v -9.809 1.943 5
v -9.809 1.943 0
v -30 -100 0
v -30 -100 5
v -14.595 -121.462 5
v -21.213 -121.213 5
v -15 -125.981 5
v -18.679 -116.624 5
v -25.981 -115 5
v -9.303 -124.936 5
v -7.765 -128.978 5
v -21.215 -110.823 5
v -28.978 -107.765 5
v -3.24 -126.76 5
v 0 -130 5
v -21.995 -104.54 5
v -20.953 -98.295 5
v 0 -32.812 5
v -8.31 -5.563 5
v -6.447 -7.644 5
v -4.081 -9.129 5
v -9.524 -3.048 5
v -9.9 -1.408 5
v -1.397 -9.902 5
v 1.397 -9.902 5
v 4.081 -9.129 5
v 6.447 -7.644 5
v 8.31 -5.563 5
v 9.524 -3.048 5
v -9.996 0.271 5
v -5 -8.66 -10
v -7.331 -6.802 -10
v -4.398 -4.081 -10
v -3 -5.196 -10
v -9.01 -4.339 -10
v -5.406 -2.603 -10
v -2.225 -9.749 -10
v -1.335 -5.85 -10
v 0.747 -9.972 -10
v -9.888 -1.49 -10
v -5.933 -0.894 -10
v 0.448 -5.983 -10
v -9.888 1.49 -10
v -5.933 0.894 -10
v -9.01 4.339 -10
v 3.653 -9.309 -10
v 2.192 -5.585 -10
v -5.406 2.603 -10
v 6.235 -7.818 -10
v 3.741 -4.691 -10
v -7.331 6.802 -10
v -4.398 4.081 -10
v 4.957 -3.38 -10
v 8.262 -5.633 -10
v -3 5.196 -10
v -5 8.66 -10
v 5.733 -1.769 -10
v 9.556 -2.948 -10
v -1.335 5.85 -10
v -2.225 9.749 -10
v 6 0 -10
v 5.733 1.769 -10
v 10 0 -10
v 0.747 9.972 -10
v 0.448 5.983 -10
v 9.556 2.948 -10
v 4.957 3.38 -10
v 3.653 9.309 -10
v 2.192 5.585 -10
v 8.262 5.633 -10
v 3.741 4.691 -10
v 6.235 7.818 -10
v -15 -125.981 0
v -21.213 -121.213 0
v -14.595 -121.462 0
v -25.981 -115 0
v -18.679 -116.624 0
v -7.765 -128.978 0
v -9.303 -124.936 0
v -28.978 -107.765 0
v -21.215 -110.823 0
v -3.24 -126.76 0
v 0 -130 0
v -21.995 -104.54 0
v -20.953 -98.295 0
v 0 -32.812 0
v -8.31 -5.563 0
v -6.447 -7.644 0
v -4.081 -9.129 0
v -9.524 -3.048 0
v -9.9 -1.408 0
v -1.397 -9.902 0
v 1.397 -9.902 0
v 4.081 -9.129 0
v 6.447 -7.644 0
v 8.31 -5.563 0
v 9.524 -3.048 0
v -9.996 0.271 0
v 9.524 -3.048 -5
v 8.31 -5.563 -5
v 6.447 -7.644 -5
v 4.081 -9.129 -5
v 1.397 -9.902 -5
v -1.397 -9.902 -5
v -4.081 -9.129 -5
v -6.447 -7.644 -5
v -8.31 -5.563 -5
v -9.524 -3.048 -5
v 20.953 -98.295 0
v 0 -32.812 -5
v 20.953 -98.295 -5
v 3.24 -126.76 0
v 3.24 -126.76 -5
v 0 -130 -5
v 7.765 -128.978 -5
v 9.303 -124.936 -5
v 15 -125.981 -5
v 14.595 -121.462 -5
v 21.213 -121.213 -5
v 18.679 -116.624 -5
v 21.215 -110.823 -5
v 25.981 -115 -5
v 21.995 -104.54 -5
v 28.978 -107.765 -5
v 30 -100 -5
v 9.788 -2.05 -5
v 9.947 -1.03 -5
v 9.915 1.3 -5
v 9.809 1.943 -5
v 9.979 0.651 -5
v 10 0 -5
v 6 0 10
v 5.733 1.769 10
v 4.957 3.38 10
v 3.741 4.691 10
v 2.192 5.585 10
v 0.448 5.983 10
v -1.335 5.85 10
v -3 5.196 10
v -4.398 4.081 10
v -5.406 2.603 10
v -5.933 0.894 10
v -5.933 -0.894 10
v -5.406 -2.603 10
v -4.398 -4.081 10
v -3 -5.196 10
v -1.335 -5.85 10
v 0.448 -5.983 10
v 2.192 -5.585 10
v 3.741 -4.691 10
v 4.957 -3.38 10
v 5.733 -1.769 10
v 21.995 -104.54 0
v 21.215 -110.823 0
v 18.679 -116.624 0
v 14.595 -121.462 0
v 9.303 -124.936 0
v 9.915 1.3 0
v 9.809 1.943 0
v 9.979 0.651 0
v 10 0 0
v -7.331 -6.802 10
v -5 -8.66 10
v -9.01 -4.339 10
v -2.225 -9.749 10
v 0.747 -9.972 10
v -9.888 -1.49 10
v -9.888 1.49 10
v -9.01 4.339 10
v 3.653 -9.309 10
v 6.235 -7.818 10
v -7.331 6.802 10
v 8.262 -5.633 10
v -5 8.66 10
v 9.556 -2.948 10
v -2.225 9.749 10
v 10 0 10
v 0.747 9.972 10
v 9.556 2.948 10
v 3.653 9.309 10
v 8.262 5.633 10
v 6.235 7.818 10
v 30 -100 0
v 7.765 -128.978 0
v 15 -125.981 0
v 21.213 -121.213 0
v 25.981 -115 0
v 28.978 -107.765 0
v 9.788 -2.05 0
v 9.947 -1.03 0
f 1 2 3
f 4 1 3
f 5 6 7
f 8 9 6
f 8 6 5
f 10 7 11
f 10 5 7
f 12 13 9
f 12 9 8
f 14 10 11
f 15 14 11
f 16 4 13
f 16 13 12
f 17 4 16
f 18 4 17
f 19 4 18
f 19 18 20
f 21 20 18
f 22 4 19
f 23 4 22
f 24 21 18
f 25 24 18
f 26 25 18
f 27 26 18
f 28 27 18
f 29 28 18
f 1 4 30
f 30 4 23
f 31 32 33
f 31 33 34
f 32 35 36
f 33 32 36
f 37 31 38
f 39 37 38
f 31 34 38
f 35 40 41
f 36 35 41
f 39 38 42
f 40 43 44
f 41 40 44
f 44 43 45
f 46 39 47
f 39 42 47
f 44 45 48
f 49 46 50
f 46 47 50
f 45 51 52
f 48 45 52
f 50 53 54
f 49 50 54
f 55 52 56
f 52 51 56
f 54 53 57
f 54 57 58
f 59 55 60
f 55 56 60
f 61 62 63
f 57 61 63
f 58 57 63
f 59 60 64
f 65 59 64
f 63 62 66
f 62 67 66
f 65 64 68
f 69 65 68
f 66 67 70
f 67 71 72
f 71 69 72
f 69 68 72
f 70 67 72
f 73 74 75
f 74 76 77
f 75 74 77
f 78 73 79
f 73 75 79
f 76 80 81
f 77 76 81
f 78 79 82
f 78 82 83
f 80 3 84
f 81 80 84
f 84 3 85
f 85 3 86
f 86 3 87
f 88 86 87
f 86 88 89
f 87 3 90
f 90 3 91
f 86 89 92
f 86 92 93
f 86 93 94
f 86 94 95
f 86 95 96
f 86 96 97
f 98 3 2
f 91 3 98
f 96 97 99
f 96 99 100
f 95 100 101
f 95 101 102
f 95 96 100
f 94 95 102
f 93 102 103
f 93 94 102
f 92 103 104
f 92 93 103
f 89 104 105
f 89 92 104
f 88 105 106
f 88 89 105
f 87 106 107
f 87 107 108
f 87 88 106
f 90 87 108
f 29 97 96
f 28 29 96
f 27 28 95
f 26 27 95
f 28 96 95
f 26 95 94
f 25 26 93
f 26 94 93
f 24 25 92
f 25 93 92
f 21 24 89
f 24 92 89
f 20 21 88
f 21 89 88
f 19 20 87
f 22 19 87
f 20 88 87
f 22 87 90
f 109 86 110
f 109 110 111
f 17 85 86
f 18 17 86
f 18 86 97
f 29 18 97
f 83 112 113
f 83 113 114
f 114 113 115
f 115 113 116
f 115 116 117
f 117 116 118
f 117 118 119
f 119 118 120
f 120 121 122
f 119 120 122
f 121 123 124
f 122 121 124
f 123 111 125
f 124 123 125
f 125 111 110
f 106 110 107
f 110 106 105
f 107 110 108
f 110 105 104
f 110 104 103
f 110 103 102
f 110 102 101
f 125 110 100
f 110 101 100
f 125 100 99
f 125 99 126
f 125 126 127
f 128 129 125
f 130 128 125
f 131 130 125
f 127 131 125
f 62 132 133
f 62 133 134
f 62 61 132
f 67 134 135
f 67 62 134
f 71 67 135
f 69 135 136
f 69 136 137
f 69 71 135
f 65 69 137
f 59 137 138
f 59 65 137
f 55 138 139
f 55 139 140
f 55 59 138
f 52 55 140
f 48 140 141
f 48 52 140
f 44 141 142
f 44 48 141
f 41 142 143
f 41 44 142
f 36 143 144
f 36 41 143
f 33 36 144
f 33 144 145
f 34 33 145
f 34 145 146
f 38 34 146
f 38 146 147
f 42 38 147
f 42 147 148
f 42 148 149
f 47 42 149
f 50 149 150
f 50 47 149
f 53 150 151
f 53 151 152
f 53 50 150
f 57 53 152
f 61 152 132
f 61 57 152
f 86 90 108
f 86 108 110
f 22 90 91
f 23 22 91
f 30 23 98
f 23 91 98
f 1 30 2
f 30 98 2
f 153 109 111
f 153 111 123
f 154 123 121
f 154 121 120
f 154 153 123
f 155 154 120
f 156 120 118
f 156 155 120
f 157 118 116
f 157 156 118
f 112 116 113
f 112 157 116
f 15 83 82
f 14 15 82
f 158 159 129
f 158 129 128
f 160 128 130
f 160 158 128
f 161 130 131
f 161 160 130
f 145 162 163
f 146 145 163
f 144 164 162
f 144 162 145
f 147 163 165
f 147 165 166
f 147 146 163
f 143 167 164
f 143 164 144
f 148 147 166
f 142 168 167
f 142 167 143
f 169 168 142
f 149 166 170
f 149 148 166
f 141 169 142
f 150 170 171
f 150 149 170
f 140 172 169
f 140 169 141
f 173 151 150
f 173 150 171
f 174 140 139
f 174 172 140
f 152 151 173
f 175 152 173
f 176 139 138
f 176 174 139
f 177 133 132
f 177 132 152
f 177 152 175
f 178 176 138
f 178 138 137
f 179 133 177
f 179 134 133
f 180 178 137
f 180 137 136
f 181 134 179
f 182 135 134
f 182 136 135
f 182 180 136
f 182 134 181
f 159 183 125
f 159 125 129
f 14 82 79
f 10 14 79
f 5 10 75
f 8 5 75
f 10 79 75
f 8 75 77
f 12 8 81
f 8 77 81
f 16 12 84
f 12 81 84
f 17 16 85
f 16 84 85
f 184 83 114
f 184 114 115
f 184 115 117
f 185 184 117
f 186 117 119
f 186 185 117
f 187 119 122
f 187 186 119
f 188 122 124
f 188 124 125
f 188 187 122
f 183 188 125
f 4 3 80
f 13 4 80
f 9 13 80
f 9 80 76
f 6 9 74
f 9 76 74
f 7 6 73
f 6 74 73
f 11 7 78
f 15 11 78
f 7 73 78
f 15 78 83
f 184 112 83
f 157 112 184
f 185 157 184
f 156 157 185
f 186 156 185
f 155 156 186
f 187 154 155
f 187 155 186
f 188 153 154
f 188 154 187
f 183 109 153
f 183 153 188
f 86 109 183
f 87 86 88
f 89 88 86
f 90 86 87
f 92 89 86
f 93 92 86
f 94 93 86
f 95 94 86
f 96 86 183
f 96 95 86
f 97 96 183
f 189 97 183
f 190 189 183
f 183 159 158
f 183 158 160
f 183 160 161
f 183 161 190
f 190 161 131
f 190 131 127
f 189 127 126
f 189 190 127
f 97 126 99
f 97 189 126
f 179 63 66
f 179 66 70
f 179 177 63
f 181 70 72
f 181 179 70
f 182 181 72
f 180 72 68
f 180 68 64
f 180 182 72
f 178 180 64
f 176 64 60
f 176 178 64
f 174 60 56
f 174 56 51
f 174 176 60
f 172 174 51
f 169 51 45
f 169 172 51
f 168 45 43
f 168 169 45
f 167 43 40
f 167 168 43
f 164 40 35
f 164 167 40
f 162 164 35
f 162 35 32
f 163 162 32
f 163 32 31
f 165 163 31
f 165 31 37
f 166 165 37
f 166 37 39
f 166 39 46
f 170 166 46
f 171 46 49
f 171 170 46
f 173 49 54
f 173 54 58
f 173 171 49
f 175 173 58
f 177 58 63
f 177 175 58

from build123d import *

# Parameters (mm, degrees)
SKETCH1_R            = 6
BOSS_EXTRUDE1_DEPTH  = 10
BOSS_EXTRUDE14_DEPTH = 5
BOSS_EXTRUDE15_DEPTH = 5


with BuildPart() as part:
    # Sketch1 → Boss-Extrude1 (new, symmetric)
    with BuildSketch(Plane.XY):
        with BuildLine():
            ThreePointArc((9.809453986617676, 1.9428361959853027), (6.1e-16, 10.000000000000004), (-9.809453986617676, 1.9428361959853029))
            ThreePointArc((-9.809453986617676, 1.9428361959853029), (-9.983713411106137, -0.5704967352225092), (-9.524285702381553, -3.0476190476190443))
            ThreePointArc((-9.524285702381553, -3.0476190476190443), (-1.84e-15, -10.000000000000004), (9.524285702381551, -3.047619047619048))
            ThreePointArc((9.524285702381551, -3.047619047619048), (9.88035568751995, -1.5422618091920235), (10.000000000000004, -2.45e-15))
            ThreePointArc((10.000000000000004, 0), (9.952249491099408, 0.9760789245299965), (9.809453986617676, 1.9428361959853027))
        make_face()
        Circle(SKETCH1_R, mode=Mode.SUBTRACT)
    extrude(amount=BOSS_EXTRUDE1_DEPTH, both=True)


with BuildPart() as body_2:
    # Sketch1<52> → Boss-Extrude14 (new body)
    with BuildSketch(Plane.XY):
        with BuildLine():
            ThreePointArc((-30, -99.99999999999994), (-21.213203435596444, -121.21320343559641), (2.16e-15, -130))
            Line((0, -130), (-3.239870411273939, -126.76012958872607))
            ThreePointArc((-3.239870411273936, -126.76012958872607), (-18.67863593878897, -116.62362075543508), (-20.953428545239394, -98.29523809523806))
            Line((-20.953428545239394, -98.29523809523806), (9.524285702381551, -3.047619047619051))
            ThreePointArc((9.524285702381553, -3.0476190476190466), (-2.4992981259121687, -9.682639561494172), (-9.809453986617678, 1.942836195985301))
            Line((-9.809453986617676, 1.9428361959853078), (-30, -99.99999999999994))
        make_face()
    extrude(amount=BOSS_EXTRUDE14_DEPTH)


with BuildPart() as body_3:
    # Sketch1<53> → Boss-Extrude15 (new body)
    with BuildSketch(Plane.XY):
        with BuildLine():
            Line((3.2398704112739423, -126.76012958872607), (0, -130))
            ThreePointArc((2.16e-15, -130), (21.213203435596423, -121.21320343559643), (30, -100.00000000000001))
            Line((30, -100), (9.809453986617676, 1.9428361959853078))
            ThreePointArc((9.809453986617676, 1.9428361959853029), (2.49929812591217, -9.682639561494168), (-9.524285702381551, -3.0476190476190474))
            Line((-9.524285702381553, -3.0476190476190483), (20.95342854523939, -98.29523809523812))
            ThreePointArc((20.953428545239394, -98.29523809523812), (18.678635938788954, -116.62362075543511), (3.239870411273943, -126.76012958872607))
        make_face()
    extrude(amount=-BOSS_EXTRUDE15_DEPTH)


solid = Compound([part.part, body_2.part, body_3.part])
